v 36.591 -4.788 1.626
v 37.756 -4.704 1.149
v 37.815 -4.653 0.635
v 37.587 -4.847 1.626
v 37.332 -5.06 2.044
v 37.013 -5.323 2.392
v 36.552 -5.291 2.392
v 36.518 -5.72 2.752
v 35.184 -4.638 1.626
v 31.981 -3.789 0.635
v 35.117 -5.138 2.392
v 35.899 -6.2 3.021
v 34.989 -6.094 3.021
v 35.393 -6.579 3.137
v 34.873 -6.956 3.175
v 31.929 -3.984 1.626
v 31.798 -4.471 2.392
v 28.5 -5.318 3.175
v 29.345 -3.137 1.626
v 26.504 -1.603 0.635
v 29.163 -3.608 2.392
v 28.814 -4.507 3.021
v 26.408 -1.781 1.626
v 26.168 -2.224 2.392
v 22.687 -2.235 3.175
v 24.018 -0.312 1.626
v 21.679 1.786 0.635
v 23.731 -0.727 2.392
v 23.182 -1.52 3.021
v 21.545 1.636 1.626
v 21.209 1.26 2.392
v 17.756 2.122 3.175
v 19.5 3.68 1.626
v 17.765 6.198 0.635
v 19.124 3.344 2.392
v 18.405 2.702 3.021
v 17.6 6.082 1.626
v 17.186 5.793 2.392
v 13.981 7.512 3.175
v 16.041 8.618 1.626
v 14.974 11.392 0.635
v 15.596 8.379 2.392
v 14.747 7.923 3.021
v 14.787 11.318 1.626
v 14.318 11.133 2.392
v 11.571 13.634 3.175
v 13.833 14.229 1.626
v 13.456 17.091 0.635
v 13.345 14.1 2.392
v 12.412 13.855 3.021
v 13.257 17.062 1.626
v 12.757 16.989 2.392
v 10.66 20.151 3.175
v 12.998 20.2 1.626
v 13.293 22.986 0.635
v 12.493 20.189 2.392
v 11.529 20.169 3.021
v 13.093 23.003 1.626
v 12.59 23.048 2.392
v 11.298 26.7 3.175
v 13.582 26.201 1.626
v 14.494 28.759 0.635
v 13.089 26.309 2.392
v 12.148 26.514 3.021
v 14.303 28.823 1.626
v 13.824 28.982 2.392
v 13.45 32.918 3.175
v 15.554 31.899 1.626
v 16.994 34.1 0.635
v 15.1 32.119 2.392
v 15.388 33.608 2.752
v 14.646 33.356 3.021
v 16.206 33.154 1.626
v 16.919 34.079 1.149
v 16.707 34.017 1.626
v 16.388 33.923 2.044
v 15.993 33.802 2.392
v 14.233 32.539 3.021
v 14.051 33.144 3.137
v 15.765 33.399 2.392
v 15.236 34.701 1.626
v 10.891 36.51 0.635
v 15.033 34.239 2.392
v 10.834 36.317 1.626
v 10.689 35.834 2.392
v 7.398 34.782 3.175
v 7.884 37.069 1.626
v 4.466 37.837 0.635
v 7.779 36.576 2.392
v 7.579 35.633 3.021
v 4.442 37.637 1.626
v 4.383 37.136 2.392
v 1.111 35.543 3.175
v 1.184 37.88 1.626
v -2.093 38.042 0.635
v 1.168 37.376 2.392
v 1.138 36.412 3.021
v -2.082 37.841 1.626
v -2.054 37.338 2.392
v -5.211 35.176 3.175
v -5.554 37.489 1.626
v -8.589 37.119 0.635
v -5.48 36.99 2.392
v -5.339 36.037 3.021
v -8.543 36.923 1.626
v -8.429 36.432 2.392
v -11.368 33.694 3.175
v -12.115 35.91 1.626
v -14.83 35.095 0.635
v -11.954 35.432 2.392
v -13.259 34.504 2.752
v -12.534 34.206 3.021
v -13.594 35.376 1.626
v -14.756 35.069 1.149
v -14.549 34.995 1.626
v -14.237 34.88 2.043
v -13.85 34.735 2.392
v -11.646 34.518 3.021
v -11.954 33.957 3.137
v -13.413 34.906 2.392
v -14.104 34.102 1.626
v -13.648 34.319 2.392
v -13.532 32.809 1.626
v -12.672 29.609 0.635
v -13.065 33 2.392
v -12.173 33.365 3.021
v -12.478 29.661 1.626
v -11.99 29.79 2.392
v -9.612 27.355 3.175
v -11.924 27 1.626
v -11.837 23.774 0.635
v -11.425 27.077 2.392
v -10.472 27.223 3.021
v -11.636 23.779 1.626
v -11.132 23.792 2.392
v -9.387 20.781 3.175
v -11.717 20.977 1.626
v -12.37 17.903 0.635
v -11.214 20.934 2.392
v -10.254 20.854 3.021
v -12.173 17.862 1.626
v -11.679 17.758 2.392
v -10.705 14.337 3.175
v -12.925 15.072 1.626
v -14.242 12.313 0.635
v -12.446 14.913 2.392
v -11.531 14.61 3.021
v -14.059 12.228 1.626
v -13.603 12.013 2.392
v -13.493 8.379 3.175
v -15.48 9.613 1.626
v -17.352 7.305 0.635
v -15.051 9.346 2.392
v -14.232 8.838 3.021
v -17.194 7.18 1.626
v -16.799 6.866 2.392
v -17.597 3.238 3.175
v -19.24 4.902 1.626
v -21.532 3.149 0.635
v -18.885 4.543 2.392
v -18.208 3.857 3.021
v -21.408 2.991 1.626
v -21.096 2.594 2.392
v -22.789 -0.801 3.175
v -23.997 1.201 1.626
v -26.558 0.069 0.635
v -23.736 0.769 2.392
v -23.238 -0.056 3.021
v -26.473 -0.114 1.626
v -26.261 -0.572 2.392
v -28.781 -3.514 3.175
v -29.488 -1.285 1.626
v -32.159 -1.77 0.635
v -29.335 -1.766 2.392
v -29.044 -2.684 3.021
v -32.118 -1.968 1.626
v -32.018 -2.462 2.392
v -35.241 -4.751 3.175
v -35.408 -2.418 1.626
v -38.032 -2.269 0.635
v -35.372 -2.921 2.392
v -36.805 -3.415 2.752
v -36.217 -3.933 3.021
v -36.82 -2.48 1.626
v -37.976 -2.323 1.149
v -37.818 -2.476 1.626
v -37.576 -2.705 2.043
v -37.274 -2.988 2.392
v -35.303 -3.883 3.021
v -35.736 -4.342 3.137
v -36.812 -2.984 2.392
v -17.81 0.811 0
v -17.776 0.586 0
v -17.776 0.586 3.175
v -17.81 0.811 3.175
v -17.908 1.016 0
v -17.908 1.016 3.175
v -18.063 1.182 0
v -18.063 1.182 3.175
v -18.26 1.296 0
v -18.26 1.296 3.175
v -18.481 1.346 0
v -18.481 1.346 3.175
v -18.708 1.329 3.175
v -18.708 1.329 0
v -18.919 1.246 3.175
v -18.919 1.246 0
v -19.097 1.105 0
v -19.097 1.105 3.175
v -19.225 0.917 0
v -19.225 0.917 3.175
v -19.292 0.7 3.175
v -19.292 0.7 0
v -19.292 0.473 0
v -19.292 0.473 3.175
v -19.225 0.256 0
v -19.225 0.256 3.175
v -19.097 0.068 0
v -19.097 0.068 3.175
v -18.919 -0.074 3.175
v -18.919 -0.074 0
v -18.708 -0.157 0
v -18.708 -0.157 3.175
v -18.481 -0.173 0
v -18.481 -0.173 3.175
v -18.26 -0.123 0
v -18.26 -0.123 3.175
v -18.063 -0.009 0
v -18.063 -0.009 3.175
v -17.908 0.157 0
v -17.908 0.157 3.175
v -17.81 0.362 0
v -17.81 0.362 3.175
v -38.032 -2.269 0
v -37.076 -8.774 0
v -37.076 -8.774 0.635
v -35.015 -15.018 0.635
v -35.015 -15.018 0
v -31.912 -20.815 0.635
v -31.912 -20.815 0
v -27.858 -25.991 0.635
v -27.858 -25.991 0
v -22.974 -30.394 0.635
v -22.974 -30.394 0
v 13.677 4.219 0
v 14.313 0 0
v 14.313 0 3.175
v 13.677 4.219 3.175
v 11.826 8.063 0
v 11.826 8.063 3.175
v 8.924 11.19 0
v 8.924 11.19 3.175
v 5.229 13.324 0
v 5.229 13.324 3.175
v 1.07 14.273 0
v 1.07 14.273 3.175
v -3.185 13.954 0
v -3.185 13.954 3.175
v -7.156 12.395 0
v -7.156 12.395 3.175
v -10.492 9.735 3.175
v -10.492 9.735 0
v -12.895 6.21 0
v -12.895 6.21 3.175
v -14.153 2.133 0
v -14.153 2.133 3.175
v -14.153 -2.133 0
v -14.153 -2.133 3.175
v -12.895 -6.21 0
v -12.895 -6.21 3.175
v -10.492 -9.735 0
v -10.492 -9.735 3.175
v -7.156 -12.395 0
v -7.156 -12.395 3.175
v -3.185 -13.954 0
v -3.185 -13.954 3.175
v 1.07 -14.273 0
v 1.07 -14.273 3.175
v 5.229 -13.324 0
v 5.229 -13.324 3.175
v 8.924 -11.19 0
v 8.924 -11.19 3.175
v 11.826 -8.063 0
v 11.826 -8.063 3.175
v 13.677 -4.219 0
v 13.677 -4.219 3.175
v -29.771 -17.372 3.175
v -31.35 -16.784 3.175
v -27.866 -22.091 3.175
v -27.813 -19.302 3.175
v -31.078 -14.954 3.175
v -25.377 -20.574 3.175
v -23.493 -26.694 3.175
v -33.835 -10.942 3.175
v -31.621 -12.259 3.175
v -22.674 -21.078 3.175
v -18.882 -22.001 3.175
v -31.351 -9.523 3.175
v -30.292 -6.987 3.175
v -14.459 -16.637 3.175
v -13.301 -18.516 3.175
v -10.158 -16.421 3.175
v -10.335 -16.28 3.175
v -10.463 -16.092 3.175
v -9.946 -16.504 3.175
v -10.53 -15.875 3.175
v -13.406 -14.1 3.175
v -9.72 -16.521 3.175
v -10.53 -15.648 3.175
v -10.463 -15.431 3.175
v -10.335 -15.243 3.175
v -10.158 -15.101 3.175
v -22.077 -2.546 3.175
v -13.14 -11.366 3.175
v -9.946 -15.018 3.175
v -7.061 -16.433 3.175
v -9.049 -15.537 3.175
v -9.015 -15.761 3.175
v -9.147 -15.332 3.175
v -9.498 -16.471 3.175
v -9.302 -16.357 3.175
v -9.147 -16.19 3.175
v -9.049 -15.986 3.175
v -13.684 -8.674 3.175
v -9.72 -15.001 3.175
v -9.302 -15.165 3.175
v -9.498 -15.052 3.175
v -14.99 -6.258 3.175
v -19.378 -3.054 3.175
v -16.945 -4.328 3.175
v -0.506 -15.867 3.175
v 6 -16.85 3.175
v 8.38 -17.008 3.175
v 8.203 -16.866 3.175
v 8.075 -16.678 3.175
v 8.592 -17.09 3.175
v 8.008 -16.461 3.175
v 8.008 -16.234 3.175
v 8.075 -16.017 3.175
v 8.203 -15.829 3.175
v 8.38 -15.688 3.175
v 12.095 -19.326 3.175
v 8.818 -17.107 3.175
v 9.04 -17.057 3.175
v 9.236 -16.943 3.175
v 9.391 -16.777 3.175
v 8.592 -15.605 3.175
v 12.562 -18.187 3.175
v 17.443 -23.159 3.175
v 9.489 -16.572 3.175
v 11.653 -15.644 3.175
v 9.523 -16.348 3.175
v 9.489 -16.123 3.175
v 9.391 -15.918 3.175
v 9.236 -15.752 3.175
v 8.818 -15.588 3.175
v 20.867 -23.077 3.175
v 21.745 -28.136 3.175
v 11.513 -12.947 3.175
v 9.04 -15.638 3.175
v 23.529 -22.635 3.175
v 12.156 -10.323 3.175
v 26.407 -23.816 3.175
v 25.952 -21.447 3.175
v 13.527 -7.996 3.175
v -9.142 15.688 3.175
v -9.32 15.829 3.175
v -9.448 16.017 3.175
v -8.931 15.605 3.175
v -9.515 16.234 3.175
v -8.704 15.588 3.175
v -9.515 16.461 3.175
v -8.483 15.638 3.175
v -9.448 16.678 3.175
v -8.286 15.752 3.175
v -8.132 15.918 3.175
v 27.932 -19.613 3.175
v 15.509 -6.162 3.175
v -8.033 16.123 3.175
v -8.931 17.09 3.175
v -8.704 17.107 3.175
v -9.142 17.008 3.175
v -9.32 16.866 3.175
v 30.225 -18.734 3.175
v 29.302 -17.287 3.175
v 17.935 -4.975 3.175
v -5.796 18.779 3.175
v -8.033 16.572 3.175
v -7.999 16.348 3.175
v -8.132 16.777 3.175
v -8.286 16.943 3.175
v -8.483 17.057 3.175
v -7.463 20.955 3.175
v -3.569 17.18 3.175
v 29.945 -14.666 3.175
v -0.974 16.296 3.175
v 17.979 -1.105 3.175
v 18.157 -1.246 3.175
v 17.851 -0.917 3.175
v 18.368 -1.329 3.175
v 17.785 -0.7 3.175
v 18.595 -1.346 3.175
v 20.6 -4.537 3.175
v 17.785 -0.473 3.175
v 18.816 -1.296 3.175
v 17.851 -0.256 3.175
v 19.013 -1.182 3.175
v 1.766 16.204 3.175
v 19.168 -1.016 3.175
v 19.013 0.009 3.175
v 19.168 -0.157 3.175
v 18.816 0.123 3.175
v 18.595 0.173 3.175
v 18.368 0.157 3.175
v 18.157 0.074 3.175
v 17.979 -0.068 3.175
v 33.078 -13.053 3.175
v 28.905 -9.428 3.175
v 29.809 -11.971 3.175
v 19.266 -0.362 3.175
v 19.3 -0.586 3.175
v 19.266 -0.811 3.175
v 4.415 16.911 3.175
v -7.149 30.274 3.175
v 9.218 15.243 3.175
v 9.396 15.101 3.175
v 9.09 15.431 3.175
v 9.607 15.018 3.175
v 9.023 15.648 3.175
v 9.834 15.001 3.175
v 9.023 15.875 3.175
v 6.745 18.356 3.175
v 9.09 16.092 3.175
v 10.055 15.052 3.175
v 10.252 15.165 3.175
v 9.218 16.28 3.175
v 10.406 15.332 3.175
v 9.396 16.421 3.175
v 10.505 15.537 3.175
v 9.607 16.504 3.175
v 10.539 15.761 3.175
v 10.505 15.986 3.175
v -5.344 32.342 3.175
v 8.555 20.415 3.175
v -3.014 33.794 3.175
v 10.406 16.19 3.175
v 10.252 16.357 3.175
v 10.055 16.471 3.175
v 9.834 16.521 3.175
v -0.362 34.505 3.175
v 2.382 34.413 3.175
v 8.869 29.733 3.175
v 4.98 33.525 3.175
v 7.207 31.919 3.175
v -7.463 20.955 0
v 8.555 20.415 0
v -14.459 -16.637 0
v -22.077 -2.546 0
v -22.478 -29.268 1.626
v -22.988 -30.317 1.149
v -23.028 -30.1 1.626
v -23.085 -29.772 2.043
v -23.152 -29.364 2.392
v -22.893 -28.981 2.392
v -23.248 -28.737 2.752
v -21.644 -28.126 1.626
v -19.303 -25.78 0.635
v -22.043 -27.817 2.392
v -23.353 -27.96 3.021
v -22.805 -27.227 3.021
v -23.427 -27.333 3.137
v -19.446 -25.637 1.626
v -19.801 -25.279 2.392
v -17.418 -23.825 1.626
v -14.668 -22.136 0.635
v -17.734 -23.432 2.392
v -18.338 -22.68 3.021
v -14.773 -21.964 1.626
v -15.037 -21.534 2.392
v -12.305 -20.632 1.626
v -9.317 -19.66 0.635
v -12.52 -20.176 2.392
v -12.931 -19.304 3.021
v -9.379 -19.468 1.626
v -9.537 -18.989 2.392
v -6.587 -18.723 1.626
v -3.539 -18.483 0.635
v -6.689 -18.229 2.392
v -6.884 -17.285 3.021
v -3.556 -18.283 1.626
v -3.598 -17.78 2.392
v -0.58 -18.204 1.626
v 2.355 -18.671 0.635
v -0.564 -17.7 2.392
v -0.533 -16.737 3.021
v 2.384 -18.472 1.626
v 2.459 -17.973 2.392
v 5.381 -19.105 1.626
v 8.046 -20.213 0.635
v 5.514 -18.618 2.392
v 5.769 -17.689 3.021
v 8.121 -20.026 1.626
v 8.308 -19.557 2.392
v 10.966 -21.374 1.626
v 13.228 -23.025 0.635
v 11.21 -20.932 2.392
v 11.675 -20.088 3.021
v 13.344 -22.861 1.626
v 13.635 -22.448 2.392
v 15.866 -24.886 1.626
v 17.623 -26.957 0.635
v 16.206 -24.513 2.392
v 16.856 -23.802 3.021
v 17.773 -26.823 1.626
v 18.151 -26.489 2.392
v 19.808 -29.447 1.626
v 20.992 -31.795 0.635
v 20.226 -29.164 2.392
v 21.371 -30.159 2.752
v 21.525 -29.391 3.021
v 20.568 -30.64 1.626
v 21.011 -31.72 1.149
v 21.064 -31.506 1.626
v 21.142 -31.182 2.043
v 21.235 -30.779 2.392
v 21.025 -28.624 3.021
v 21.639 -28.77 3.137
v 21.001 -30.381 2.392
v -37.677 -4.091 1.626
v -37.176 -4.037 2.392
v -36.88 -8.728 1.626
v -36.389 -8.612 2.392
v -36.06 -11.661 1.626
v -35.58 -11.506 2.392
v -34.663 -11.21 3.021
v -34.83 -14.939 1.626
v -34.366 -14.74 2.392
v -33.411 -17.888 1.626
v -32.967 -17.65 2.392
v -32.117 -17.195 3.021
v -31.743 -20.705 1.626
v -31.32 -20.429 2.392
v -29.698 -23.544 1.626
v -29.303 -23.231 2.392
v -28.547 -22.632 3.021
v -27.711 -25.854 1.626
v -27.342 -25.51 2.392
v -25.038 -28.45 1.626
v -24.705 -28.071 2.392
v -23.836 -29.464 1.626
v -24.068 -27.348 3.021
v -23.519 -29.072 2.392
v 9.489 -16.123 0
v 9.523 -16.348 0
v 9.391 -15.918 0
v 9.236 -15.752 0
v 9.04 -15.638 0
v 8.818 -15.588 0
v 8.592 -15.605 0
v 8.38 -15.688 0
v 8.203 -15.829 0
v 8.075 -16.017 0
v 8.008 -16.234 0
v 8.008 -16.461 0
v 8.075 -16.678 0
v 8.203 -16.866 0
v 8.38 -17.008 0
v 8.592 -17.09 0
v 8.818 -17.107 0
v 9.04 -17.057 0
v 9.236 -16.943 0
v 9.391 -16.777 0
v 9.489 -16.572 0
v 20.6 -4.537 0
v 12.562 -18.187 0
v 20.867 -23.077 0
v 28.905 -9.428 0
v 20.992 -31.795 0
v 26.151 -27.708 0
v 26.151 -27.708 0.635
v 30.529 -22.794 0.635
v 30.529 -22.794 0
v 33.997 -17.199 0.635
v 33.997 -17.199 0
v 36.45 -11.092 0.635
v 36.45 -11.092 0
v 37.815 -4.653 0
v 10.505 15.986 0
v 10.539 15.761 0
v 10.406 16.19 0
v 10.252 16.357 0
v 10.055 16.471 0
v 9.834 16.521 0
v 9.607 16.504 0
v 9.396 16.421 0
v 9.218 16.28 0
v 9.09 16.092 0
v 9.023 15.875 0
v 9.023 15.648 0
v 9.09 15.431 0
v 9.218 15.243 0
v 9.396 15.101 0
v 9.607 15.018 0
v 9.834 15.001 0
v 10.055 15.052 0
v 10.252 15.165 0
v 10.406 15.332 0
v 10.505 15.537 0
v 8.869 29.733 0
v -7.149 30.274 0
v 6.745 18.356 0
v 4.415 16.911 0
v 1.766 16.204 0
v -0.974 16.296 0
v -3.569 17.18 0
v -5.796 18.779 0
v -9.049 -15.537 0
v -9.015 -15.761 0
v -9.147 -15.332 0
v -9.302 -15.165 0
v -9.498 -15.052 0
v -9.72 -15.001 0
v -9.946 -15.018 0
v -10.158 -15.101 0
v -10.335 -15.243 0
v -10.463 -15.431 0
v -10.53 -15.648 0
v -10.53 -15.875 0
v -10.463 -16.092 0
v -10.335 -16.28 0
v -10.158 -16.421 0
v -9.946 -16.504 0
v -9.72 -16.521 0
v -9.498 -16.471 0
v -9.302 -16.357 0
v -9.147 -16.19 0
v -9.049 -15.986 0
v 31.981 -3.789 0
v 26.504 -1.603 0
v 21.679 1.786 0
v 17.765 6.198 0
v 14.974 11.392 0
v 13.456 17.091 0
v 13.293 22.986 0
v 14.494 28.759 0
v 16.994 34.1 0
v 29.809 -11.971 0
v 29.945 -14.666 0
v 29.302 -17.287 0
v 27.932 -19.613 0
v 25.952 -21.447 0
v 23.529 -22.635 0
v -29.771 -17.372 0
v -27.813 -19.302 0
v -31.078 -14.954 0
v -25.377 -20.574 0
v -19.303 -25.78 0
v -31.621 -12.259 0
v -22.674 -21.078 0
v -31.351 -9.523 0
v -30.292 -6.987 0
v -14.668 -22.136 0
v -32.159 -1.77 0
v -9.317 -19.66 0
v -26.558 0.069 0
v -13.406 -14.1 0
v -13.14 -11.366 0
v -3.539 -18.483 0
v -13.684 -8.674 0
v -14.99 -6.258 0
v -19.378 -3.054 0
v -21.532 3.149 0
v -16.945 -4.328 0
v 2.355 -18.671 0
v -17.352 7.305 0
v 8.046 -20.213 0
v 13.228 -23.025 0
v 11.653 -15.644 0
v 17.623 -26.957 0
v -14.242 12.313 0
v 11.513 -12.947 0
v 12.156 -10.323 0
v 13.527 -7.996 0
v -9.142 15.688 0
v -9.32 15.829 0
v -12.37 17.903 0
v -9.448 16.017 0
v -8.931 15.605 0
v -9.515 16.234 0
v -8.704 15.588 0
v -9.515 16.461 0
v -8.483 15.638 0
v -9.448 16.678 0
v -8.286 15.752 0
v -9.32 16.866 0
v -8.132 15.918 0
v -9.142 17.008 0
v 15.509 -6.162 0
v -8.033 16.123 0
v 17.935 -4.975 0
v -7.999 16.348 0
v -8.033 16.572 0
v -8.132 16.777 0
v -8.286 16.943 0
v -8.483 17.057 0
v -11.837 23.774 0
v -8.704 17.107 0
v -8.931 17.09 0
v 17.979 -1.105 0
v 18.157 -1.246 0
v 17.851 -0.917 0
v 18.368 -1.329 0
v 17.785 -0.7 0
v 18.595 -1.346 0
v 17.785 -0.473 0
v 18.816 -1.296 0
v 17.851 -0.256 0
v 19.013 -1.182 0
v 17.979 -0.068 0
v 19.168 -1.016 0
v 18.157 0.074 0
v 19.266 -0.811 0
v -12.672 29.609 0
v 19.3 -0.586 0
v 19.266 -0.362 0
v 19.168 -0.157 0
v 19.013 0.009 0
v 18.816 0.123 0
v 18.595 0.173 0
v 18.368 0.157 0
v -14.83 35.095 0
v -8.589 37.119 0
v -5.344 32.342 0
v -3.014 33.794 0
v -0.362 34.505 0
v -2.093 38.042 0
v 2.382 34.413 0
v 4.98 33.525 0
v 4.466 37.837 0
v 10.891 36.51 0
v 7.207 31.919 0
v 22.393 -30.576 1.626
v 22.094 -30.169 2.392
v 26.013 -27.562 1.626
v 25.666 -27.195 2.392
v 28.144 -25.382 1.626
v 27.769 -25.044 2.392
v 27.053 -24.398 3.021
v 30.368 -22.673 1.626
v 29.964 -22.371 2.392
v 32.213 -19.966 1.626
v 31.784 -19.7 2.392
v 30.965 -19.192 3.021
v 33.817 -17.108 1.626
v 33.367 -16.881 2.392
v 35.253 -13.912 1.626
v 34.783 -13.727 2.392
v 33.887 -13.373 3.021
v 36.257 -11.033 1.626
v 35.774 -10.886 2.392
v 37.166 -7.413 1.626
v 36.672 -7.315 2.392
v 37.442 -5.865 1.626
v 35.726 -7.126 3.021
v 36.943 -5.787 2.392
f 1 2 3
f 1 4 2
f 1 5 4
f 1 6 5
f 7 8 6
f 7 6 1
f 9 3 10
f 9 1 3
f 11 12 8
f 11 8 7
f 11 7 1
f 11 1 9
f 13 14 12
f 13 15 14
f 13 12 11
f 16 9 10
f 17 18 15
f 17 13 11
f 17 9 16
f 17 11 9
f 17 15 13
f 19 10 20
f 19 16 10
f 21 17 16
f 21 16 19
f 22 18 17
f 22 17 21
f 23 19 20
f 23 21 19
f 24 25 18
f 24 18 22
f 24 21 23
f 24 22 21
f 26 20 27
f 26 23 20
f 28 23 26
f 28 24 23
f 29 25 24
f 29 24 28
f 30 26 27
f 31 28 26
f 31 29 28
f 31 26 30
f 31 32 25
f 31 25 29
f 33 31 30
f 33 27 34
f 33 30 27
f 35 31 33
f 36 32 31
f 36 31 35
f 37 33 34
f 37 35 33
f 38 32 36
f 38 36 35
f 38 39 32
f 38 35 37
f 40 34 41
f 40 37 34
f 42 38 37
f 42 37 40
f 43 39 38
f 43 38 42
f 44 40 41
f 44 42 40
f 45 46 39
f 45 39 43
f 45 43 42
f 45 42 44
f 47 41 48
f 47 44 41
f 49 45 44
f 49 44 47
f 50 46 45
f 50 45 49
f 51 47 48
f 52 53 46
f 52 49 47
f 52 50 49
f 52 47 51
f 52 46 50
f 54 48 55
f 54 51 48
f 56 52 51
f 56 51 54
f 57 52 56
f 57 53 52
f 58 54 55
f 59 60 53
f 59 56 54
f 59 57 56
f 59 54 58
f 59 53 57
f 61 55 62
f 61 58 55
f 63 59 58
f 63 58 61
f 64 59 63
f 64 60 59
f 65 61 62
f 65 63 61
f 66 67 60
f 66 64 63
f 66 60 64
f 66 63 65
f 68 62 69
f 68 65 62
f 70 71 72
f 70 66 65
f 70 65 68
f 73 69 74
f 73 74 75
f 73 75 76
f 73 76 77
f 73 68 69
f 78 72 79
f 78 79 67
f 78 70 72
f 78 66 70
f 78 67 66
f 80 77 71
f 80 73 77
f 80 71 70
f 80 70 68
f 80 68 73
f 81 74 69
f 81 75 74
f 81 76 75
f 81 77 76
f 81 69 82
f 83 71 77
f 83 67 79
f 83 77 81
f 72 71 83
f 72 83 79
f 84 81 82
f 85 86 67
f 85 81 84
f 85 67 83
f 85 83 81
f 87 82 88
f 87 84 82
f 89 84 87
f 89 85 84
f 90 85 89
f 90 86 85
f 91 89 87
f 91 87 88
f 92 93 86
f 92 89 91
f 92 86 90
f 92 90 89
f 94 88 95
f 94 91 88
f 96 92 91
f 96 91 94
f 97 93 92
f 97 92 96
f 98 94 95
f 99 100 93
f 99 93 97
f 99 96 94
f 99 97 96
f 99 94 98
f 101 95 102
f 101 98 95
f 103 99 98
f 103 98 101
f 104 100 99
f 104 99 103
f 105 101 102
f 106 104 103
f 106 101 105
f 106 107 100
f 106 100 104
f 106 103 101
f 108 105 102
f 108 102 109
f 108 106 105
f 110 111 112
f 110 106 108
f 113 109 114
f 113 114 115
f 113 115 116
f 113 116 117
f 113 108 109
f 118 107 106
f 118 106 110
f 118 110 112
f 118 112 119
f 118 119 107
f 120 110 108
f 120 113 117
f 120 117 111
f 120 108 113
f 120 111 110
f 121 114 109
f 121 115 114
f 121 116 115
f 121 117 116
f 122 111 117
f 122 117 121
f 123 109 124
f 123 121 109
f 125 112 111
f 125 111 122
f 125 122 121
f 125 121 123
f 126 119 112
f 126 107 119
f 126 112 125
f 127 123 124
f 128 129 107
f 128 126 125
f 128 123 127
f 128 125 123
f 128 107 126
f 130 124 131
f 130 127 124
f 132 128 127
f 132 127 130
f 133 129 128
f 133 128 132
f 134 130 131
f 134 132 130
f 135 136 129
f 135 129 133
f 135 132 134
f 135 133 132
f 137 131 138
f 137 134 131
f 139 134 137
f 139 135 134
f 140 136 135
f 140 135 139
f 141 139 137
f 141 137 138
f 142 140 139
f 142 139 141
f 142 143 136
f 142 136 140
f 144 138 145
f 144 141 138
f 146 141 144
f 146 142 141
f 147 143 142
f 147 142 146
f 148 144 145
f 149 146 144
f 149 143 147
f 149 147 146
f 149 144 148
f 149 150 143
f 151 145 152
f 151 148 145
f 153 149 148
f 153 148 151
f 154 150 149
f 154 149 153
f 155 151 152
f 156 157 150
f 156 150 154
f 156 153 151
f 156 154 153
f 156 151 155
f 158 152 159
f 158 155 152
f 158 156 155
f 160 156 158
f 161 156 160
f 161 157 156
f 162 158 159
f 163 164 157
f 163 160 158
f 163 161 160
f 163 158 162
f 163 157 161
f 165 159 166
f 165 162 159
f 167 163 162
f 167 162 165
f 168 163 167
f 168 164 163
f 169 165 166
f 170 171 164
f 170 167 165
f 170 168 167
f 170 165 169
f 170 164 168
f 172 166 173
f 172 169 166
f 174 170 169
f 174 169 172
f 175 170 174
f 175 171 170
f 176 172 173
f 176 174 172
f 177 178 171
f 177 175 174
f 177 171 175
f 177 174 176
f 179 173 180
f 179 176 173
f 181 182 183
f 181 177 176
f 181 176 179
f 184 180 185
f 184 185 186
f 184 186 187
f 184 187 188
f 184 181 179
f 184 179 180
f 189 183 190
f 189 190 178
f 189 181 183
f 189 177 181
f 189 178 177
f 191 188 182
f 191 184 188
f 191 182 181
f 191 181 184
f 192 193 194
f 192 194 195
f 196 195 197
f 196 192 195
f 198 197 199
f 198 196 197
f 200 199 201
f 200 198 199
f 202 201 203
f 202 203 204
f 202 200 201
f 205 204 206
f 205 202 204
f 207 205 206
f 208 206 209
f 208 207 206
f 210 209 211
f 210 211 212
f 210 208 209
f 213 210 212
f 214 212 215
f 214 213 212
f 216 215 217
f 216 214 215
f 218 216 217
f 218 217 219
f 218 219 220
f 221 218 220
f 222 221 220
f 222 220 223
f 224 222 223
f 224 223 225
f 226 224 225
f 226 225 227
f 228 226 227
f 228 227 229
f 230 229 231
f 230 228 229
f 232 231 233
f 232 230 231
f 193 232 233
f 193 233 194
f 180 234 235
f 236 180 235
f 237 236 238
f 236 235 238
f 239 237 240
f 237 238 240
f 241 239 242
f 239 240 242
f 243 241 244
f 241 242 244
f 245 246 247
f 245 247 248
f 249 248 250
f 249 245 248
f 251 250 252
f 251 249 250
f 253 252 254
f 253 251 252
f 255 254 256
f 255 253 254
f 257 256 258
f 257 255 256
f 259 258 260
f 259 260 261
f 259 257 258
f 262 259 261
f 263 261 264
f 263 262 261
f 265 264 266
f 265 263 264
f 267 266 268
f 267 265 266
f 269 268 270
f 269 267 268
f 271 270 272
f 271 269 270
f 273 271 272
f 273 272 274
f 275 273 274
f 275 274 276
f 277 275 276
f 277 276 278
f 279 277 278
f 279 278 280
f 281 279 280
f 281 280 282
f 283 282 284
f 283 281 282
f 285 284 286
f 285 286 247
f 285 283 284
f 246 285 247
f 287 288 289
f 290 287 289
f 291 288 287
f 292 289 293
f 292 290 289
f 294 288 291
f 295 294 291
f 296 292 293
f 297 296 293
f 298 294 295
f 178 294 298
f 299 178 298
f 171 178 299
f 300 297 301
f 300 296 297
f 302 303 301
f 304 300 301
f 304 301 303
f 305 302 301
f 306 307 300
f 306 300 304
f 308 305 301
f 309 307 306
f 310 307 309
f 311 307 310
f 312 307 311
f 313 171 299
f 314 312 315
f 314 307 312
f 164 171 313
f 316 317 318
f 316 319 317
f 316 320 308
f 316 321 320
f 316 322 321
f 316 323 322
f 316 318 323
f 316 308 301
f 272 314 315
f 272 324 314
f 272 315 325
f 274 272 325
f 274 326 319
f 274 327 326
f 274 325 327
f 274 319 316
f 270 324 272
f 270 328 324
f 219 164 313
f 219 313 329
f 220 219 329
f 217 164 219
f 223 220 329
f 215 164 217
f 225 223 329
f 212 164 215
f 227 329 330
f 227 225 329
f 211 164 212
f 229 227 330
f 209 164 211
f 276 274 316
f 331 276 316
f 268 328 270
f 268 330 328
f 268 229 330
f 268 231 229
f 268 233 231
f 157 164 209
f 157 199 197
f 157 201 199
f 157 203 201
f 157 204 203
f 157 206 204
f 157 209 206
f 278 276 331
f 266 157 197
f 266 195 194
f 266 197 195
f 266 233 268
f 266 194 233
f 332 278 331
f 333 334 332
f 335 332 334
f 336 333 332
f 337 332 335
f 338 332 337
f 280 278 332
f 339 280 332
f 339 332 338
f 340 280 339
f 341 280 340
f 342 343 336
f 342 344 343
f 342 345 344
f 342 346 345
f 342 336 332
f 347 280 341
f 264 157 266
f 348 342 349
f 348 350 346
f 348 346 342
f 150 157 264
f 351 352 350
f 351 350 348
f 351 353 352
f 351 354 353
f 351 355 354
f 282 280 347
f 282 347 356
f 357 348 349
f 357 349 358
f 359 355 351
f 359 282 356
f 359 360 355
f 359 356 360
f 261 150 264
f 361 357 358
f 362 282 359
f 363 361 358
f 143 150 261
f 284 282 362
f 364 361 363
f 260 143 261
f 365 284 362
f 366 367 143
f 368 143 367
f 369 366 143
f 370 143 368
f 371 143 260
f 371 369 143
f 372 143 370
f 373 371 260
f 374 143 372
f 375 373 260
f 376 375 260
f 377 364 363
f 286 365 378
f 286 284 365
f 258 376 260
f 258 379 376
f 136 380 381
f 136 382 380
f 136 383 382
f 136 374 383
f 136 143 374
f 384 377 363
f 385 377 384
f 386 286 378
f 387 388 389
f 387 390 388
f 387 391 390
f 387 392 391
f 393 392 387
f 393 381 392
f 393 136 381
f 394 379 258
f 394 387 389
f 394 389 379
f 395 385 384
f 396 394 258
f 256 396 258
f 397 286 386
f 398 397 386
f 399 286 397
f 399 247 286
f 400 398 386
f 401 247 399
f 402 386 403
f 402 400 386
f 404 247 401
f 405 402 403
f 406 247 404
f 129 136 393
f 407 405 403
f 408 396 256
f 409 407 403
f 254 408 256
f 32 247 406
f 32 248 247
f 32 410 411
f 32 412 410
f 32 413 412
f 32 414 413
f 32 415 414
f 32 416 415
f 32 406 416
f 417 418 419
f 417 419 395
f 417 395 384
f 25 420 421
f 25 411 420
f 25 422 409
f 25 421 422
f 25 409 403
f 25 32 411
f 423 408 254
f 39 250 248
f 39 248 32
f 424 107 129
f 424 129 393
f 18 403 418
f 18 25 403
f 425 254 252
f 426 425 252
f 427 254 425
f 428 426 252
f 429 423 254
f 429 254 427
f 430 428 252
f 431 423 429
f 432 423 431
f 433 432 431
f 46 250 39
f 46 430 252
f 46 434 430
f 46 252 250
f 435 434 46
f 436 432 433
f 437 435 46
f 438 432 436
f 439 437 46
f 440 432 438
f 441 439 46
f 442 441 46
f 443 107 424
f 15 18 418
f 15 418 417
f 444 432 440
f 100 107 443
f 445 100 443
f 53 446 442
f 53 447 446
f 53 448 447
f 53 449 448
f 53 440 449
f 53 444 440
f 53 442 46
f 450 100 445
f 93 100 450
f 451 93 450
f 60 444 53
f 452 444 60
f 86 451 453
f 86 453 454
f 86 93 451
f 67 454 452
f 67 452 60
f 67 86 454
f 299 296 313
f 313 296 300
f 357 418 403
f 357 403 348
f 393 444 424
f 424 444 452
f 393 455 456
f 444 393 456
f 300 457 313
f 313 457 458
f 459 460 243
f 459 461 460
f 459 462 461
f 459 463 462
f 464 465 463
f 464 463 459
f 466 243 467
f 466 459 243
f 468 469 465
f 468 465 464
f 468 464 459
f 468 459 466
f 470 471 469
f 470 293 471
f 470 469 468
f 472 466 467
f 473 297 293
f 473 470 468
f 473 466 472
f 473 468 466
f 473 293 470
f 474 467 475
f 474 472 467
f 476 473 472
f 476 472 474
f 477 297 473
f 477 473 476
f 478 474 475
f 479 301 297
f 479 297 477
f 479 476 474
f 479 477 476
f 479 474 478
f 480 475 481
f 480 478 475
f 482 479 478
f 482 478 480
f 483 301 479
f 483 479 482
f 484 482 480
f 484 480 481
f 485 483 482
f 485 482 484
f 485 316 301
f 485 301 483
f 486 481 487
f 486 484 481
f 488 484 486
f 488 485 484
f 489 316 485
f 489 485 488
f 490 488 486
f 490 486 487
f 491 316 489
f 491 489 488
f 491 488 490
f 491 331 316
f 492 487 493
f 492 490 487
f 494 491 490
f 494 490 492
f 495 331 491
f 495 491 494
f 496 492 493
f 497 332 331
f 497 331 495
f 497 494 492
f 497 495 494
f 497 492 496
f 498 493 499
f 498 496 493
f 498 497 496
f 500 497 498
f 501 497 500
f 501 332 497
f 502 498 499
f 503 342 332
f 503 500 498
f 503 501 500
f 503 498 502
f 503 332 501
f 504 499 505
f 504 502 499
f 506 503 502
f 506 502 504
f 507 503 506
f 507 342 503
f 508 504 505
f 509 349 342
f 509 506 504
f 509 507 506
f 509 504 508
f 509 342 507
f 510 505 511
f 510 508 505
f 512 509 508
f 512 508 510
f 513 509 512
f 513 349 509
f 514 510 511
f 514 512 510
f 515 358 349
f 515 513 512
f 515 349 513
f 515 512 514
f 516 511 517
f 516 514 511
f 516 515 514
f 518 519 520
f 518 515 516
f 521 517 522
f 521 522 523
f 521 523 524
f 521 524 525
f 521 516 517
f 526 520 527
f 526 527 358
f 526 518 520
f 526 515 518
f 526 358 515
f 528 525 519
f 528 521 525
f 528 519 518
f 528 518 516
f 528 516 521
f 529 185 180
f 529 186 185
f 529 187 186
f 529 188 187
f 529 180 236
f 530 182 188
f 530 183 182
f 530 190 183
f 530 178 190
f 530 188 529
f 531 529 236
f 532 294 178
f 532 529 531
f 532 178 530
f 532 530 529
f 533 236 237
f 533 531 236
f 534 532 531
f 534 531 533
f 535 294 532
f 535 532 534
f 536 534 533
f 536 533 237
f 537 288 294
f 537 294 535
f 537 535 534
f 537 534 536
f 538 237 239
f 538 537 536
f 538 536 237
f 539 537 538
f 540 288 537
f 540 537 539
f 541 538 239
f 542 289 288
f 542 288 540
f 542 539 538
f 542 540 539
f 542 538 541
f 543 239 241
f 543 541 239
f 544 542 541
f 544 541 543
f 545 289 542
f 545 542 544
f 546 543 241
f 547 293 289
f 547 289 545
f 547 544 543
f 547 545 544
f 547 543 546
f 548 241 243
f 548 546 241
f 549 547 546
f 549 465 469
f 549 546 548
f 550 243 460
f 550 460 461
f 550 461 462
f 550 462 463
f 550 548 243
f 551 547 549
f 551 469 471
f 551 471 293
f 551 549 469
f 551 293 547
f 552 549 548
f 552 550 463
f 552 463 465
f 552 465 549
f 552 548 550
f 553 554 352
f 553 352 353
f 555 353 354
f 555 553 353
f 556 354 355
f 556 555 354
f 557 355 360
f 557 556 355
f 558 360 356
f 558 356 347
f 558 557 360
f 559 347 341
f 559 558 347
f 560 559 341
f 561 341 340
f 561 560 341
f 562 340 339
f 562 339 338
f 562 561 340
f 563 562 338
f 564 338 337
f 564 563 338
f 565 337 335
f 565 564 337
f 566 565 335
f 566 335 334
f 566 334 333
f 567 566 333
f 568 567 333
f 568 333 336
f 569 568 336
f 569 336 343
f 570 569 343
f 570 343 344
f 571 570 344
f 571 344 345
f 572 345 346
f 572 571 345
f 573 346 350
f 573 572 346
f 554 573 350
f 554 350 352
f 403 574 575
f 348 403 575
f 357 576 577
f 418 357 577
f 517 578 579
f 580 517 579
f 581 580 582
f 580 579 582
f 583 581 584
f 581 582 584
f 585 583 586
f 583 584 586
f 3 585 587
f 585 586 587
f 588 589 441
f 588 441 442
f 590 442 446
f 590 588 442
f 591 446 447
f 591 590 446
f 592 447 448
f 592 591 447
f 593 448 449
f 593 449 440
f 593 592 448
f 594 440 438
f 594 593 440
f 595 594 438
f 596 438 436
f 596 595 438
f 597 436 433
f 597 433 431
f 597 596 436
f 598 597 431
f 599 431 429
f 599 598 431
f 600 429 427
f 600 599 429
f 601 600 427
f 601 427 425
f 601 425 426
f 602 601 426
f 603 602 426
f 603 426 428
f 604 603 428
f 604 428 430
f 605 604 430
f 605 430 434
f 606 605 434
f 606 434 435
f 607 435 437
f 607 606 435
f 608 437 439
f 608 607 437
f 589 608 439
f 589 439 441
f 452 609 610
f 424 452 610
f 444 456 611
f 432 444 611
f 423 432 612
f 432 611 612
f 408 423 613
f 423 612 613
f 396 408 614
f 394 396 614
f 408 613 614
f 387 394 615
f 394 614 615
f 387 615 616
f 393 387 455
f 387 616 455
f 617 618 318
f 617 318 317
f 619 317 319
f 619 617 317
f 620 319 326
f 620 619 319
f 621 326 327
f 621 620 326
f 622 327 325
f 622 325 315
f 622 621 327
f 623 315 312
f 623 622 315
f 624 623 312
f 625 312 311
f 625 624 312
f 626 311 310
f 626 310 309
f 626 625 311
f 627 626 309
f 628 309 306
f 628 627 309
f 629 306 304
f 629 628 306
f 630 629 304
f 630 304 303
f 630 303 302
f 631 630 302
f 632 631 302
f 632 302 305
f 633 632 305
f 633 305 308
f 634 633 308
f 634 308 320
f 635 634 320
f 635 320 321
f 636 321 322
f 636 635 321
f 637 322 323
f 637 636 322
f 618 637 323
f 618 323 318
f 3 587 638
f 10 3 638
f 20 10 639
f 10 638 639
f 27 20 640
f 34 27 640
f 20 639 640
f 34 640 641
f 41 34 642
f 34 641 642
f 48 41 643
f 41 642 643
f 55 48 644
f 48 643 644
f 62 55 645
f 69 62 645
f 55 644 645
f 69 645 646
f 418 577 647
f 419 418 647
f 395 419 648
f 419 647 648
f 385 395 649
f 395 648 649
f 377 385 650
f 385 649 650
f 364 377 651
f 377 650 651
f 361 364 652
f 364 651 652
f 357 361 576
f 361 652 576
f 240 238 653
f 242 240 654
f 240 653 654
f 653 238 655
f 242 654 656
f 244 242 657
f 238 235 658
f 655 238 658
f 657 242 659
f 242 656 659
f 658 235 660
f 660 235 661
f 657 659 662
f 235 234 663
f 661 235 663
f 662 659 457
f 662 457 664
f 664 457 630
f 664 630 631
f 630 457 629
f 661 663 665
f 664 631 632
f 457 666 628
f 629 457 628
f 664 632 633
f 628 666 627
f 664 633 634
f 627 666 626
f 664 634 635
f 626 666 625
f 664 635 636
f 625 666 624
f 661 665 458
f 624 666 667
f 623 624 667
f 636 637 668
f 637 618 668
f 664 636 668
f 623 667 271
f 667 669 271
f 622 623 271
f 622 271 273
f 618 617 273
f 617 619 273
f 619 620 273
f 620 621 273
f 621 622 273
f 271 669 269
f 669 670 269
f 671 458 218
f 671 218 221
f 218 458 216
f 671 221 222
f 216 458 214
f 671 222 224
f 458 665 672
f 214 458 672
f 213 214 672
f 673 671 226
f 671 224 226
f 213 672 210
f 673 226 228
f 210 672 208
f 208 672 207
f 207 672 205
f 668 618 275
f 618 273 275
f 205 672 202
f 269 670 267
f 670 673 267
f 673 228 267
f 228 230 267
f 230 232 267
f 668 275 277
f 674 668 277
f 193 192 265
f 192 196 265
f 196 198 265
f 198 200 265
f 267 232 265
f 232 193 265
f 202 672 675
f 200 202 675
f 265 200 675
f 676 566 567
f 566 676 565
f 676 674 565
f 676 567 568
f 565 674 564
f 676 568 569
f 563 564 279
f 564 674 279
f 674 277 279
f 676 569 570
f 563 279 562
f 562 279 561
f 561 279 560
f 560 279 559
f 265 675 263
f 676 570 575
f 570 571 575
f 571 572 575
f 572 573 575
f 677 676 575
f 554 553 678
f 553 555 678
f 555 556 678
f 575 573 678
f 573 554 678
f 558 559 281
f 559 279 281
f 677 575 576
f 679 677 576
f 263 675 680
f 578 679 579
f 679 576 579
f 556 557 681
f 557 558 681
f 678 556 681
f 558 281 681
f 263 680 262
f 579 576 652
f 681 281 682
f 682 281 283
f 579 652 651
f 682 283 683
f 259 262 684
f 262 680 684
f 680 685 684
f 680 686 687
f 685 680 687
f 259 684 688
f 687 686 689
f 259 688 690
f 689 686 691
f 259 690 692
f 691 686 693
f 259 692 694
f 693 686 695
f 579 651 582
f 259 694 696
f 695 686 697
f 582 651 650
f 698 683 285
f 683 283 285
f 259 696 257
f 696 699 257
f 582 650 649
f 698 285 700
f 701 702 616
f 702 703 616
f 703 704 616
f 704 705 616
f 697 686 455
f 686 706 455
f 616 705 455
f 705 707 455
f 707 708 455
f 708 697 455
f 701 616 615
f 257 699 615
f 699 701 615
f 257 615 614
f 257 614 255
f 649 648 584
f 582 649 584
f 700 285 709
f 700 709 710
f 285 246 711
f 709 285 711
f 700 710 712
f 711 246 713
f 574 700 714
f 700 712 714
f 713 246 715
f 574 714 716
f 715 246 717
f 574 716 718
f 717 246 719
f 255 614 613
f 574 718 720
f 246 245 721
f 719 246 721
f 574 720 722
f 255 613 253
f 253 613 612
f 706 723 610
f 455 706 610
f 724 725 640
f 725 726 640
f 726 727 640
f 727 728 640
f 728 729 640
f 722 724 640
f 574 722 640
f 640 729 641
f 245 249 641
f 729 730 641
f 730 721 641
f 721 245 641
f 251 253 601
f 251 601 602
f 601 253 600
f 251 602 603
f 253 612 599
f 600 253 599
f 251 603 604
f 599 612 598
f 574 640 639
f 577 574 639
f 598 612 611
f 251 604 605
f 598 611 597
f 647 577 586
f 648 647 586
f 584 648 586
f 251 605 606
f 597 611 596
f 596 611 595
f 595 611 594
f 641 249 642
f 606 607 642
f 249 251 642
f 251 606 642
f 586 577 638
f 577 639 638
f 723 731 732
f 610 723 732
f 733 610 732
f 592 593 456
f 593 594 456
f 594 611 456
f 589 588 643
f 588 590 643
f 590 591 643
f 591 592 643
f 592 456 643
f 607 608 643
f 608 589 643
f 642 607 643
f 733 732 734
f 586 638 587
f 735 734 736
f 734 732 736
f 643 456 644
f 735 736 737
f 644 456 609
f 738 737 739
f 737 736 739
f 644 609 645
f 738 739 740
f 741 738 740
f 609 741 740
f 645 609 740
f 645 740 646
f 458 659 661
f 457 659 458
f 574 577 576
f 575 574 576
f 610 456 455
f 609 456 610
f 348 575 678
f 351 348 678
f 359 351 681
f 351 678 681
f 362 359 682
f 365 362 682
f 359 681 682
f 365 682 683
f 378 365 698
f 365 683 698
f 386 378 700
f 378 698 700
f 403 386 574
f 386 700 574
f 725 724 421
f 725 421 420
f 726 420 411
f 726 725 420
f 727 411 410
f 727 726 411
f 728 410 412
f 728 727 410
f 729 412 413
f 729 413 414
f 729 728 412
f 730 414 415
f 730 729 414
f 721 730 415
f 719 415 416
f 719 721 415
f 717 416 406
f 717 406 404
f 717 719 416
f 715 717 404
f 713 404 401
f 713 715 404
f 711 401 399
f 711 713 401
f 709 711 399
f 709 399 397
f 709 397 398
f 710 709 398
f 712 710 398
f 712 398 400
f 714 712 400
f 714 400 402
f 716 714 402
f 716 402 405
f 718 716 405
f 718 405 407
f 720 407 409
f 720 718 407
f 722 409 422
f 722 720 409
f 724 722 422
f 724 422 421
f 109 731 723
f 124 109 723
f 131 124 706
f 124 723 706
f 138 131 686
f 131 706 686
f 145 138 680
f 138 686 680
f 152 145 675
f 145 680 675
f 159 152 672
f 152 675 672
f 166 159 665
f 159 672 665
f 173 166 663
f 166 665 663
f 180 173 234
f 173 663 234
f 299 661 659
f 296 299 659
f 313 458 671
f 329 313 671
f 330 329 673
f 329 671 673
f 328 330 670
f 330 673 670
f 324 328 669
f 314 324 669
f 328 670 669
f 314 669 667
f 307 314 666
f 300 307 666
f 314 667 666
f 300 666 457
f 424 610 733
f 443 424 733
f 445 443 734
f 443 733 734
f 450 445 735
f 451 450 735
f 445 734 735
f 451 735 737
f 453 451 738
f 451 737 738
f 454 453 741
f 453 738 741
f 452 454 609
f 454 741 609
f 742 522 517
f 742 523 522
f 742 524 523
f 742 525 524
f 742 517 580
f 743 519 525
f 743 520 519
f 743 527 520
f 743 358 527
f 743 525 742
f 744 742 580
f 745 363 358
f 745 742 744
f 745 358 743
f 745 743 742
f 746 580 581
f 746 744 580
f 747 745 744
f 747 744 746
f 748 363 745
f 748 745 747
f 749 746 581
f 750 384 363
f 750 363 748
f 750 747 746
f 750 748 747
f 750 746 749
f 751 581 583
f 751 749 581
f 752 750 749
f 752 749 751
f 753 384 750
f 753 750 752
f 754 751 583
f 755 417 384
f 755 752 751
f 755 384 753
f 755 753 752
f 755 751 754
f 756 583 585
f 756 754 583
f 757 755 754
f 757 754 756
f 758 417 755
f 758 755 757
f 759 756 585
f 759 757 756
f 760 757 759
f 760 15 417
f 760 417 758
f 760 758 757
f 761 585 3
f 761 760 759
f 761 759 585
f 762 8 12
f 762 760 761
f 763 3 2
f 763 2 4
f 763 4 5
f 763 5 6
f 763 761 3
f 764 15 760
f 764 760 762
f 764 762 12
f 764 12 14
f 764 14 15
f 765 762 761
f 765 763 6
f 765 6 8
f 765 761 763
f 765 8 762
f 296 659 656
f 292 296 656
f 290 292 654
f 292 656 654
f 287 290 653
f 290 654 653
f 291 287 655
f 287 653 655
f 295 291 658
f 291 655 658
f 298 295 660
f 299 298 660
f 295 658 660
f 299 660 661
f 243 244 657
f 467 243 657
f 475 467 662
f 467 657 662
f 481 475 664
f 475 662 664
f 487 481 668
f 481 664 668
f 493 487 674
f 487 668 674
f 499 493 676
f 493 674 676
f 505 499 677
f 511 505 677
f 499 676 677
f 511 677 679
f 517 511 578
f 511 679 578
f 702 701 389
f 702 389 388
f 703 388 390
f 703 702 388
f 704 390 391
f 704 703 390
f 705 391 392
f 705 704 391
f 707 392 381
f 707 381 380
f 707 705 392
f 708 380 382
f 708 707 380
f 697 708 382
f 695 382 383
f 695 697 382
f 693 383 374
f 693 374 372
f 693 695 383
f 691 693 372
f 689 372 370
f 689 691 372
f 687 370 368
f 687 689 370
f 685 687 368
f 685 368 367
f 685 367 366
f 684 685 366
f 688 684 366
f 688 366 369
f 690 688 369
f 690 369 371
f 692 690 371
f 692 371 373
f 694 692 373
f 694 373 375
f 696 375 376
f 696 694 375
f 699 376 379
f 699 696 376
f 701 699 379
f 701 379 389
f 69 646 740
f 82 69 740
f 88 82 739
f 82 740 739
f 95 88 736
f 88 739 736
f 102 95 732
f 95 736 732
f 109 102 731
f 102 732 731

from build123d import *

# Parameters (mm, degrees)
F0_R     = 0.762
F0_R_2   = 14.3129
F1_DEPTH = 3.175
F2_R     = 2.54


with BuildPart() as f1:
    # F0 (on Top) → F1 (new body)
    with BuildSketch(Plane.XY):
        with BuildLine():
            ThreePointArc((37.814818885, -4.6528993857), (16.2183640692, 8.713670097), (16.9939270688, 34.1000944688))
            ThreePointArc((16.9939270688, 34.1000944688), (1.1909176957, 38.0813827879), (-14.8299813197, 35.0953223957))
            ThreePointArc((-14.8299813197, 35.0953223957), (-15.6508840085, 9.7188762367), (-38.0323831061, -2.2688841474))
            ThreePointArc((-38.0323831061, -2.2688841474), (-33.5888120947, -17.9833729335), (-22.9742885145, -30.3939478721))
            ThreePointArc((-22.9742885145, -30.3939478721), (-0.5866848831, -18.4058352173), (20.9920077442, -31.7953709031))
            ThreePointArc((20.9920077442, -31.7953709031), (32.3842423806, -20.0716428185), (37.814818885, -4.6528993857))
        make_face()
        with BuildLine():
            ThreePointArc((-22.6742041591, -21.077906737), (-30.5143778905, -16.2115761649), (-30.2921493088, -6.9866039788))
            Line((-30.2921493088, -6.9866039788), (-22.6742041591, -21.077906737))
        make_face(mode=Mode.SUBTRACT)
        with Locations((-9.7768361415, -15.7612173143)):
            Circle(F0_R, mode=Mode.SUBTRACT)
        with BuildLine():
            ThreePointArc((-22.077246757, -2.5455187134), (-14.2471455868, -7.4172946457), (-14.4593016073, -16.6368214716))
            Line((-14.4593016073, -16.6368214716), (-22.077246757, -2.5455187134))
        make_face(mode=Mode.SUBTRACT)
        with Locations((8.761196518, -16.3475971243)):
            Circle(F0_R, mode=Mode.SUBTRACT)
        with BuildLine():
            ThreePointArc((12.5619529023, -18.1867123268), (12.756507598, -9.1097250706), (20.6001486004, -4.5373247159))
            Line((20.6001486004, -4.5373247159), (12.5619529023, -18.1867123268))
        make_face(mode=Mode.SUBTRACT)
        with Locations((18.5380326595, -0.58637981)):
            Circle(F0_R, mode=Mode.SUBTRACT)
        with BuildLine():
            Line((20.8666791326, -23.0774090058), (28.9048748307, -9.4280213948))
            ThreePointArc((28.9048748307, -9.4280213948), (28.7016006579, -18.4998737054), (20.8666791326, -23.0774090058))
        make_face(mode=Mode.SUBTRACT)
        with Locations((-18.5380326595, 0.58637981)):
            Circle(F0_R, mode=Mode.SUBTRACT)
        with Locations((-8.761196518, 16.3475971243)):
            Circle(F0_R, mode=Mode.SUBTRACT)
        Circle(F0_R_2, mode=Mode.SUBTRACT)
        with BuildLine():
            ThreePointArc((8.554840384, 20.4151336434), (0.3927024044, 16.1488375122), (-7.4634526605, 20.9553546163))
            Line((-7.4634526605, 20.9553546163), (8.554840384, 20.4151336434))
        make_face(mode=Mode.SUBTRACT)
        with Locations((9.7768361415, 15.7612173143)):
            Circle(F0_R, mode=Mode.SUBTRACT)
        with BuildLine():
            Line((8.86910012, 29.7333659897), (-7.1491929245, 30.2735869625))
            ThreePointArc((-7.1491929245, 30.2735869625), (1.0136418787, 34.5605448721), (8.86910012, 29.7333659897))
        make_face(mode=Mode.SUBTRACT)
    extrude(amount=F1_DEPTH)

    # F2
    f2_edges = [f1.edges().sort_by_distance(p)[0] for p in [
        (-0.586685, -18.405835, 3.175),
        (1.190918, 38.081383, 3.175),
        (-15.650884, 9.718876, 3.175),
        (-33.588812, -17.983373, 3.175),
        (16.218364, 8.71367, 3.175),
        (32.384242, -20.071643, 3.175),
    ]]
    fillet(f2_edges, radius=F2_R)


solid = f1.part
